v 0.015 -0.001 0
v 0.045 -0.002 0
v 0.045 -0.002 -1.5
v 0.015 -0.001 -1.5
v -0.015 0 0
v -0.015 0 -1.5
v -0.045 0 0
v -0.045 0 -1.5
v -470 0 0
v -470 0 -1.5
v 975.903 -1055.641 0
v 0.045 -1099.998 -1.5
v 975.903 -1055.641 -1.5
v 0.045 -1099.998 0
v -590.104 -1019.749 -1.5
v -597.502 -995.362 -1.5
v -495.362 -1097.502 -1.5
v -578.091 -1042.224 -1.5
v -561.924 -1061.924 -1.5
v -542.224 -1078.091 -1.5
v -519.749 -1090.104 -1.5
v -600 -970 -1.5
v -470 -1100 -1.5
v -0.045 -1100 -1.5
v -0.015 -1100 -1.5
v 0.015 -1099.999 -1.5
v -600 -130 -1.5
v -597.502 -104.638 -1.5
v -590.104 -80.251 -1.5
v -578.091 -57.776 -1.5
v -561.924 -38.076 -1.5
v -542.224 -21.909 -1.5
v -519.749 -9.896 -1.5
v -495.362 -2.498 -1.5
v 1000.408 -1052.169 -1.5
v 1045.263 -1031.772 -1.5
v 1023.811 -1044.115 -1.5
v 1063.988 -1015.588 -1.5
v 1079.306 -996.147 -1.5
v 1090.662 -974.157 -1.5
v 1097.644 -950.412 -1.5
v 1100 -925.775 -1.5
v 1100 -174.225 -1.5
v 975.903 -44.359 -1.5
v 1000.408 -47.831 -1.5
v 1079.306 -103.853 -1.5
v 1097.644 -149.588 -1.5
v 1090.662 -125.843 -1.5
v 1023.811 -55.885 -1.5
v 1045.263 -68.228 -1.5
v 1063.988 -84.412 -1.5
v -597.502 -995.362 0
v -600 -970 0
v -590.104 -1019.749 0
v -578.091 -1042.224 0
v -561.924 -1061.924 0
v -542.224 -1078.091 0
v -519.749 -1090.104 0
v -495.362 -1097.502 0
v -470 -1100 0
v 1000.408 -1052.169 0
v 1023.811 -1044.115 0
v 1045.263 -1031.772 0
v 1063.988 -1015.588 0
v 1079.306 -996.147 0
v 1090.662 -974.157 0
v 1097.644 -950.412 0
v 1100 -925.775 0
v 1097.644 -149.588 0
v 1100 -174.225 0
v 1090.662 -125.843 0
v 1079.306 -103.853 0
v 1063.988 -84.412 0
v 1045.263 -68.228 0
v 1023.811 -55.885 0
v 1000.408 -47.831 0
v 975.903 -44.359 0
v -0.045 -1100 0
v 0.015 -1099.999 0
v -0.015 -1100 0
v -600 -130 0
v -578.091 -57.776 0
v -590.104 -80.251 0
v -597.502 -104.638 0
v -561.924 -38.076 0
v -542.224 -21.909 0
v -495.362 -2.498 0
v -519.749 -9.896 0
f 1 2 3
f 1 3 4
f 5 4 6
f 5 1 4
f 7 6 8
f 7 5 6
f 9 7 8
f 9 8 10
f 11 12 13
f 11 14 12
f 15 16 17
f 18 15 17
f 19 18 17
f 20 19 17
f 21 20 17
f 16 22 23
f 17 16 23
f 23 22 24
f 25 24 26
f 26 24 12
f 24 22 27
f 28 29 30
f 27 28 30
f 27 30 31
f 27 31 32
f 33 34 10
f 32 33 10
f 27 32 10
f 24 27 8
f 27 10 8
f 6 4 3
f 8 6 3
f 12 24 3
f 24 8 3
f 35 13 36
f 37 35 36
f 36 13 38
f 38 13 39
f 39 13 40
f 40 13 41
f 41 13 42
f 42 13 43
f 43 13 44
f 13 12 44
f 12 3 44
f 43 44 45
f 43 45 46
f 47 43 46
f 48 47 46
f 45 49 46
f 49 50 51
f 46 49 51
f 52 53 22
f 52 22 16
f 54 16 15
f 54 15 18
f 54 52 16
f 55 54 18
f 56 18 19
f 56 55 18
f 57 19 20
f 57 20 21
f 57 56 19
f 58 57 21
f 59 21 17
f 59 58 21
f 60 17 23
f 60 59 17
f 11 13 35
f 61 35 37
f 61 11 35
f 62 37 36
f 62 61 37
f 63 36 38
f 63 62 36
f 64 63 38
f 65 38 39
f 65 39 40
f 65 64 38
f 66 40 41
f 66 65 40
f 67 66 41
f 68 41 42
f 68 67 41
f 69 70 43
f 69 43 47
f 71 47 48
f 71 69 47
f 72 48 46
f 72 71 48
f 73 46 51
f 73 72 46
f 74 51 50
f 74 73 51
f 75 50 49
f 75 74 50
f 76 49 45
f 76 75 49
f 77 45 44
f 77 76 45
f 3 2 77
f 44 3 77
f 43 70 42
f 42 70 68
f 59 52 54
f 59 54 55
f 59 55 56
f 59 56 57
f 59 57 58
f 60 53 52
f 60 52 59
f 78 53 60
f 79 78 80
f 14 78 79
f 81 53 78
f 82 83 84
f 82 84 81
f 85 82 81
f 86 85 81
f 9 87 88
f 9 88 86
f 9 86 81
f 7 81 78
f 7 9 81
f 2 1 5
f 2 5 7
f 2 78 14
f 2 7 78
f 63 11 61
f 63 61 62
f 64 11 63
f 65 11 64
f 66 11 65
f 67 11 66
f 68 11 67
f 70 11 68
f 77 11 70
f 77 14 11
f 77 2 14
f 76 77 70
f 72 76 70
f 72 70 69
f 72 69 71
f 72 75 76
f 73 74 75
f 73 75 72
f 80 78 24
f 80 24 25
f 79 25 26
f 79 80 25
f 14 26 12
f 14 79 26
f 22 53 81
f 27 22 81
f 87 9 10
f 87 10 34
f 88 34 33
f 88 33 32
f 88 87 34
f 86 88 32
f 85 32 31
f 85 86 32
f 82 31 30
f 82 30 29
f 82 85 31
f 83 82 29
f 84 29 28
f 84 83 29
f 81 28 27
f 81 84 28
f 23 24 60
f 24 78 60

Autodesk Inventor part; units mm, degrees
ref_plane "YZ Plane" through (0, 0, 0) normal (1, 0, 0) x (0, 1, 0)
ref_plane "XZ Plane" through (0, 0, 0) normal (0, 1, 0) x (-1, 0, 0)
ref_plane "Work Plane1" through (0, 0, 0) normal (0, 0, 1) x (1, 0, 0)
sketch "Sketch1" plane through (0, 0, 0) normal (0, 0, 1) x (1, 0, 0)
  arc A0 (-0.0454, -1100) -> (0.0454, -1099.9979) centre (-0.0454, -1098) ccw
  line L0 (0.0454, -1099.9979) -> (975.903, -1055.6408)
  arc A1 (975.903, -1055.6408) -> (1100, -925.7749) centre (970, -925.7749) ccw
  line L1 (1100, -174.2251) -> (1100, -925.7749)
  arc A2 (1100, -174.2251) -> (975.903, -44.3592) centre (970, -174.2251) ccw
  line L2 (0.0454, -0.0021) -> (975.903, -44.3592)
  arc A3 (0.0454, -0.0021) -> (-0.0454, 0) centre (-0.0454, -2) ccw
  line L3 (-0.0454, 0) -> (-470, 0)
  arc A4 (-470, 0) -> (-600, -130) centre (-470, -130) ccw
  line L4 (-600, -970) -> (-600, -130)
  arc A5 (-600, -970) -> (-470, -1100) centre (-470, -970) ccw
  line L5 (-0.0454, -1100) -> (-470, -1100)
  point P0 (0, 0)
extrude "Plate1" add sketch "Sketch1" against normal blind 1.5
equation "\"d0\" = Thickness"
equation "\"BendRadius\" = Thickness"
equation "\"BendReliefWidth\" = Thickness"
equation "\"BendReliefDepth\" = 0.5 * Thickness"
equation "\"CornerReliefSize\" = 4 * Thickness"
equation "\"MinimumRemnant\" = 2 * Thickness"
equation "\"TransitionRadius\" = BendRadius"
equation "\"JacobiRadiusSize\" = BendRadius"
equation "\"GapSize\" = Thickness"
equation "\"Thickness\" = 1.5"
properties part number "CARCASA_ALUM_4"
